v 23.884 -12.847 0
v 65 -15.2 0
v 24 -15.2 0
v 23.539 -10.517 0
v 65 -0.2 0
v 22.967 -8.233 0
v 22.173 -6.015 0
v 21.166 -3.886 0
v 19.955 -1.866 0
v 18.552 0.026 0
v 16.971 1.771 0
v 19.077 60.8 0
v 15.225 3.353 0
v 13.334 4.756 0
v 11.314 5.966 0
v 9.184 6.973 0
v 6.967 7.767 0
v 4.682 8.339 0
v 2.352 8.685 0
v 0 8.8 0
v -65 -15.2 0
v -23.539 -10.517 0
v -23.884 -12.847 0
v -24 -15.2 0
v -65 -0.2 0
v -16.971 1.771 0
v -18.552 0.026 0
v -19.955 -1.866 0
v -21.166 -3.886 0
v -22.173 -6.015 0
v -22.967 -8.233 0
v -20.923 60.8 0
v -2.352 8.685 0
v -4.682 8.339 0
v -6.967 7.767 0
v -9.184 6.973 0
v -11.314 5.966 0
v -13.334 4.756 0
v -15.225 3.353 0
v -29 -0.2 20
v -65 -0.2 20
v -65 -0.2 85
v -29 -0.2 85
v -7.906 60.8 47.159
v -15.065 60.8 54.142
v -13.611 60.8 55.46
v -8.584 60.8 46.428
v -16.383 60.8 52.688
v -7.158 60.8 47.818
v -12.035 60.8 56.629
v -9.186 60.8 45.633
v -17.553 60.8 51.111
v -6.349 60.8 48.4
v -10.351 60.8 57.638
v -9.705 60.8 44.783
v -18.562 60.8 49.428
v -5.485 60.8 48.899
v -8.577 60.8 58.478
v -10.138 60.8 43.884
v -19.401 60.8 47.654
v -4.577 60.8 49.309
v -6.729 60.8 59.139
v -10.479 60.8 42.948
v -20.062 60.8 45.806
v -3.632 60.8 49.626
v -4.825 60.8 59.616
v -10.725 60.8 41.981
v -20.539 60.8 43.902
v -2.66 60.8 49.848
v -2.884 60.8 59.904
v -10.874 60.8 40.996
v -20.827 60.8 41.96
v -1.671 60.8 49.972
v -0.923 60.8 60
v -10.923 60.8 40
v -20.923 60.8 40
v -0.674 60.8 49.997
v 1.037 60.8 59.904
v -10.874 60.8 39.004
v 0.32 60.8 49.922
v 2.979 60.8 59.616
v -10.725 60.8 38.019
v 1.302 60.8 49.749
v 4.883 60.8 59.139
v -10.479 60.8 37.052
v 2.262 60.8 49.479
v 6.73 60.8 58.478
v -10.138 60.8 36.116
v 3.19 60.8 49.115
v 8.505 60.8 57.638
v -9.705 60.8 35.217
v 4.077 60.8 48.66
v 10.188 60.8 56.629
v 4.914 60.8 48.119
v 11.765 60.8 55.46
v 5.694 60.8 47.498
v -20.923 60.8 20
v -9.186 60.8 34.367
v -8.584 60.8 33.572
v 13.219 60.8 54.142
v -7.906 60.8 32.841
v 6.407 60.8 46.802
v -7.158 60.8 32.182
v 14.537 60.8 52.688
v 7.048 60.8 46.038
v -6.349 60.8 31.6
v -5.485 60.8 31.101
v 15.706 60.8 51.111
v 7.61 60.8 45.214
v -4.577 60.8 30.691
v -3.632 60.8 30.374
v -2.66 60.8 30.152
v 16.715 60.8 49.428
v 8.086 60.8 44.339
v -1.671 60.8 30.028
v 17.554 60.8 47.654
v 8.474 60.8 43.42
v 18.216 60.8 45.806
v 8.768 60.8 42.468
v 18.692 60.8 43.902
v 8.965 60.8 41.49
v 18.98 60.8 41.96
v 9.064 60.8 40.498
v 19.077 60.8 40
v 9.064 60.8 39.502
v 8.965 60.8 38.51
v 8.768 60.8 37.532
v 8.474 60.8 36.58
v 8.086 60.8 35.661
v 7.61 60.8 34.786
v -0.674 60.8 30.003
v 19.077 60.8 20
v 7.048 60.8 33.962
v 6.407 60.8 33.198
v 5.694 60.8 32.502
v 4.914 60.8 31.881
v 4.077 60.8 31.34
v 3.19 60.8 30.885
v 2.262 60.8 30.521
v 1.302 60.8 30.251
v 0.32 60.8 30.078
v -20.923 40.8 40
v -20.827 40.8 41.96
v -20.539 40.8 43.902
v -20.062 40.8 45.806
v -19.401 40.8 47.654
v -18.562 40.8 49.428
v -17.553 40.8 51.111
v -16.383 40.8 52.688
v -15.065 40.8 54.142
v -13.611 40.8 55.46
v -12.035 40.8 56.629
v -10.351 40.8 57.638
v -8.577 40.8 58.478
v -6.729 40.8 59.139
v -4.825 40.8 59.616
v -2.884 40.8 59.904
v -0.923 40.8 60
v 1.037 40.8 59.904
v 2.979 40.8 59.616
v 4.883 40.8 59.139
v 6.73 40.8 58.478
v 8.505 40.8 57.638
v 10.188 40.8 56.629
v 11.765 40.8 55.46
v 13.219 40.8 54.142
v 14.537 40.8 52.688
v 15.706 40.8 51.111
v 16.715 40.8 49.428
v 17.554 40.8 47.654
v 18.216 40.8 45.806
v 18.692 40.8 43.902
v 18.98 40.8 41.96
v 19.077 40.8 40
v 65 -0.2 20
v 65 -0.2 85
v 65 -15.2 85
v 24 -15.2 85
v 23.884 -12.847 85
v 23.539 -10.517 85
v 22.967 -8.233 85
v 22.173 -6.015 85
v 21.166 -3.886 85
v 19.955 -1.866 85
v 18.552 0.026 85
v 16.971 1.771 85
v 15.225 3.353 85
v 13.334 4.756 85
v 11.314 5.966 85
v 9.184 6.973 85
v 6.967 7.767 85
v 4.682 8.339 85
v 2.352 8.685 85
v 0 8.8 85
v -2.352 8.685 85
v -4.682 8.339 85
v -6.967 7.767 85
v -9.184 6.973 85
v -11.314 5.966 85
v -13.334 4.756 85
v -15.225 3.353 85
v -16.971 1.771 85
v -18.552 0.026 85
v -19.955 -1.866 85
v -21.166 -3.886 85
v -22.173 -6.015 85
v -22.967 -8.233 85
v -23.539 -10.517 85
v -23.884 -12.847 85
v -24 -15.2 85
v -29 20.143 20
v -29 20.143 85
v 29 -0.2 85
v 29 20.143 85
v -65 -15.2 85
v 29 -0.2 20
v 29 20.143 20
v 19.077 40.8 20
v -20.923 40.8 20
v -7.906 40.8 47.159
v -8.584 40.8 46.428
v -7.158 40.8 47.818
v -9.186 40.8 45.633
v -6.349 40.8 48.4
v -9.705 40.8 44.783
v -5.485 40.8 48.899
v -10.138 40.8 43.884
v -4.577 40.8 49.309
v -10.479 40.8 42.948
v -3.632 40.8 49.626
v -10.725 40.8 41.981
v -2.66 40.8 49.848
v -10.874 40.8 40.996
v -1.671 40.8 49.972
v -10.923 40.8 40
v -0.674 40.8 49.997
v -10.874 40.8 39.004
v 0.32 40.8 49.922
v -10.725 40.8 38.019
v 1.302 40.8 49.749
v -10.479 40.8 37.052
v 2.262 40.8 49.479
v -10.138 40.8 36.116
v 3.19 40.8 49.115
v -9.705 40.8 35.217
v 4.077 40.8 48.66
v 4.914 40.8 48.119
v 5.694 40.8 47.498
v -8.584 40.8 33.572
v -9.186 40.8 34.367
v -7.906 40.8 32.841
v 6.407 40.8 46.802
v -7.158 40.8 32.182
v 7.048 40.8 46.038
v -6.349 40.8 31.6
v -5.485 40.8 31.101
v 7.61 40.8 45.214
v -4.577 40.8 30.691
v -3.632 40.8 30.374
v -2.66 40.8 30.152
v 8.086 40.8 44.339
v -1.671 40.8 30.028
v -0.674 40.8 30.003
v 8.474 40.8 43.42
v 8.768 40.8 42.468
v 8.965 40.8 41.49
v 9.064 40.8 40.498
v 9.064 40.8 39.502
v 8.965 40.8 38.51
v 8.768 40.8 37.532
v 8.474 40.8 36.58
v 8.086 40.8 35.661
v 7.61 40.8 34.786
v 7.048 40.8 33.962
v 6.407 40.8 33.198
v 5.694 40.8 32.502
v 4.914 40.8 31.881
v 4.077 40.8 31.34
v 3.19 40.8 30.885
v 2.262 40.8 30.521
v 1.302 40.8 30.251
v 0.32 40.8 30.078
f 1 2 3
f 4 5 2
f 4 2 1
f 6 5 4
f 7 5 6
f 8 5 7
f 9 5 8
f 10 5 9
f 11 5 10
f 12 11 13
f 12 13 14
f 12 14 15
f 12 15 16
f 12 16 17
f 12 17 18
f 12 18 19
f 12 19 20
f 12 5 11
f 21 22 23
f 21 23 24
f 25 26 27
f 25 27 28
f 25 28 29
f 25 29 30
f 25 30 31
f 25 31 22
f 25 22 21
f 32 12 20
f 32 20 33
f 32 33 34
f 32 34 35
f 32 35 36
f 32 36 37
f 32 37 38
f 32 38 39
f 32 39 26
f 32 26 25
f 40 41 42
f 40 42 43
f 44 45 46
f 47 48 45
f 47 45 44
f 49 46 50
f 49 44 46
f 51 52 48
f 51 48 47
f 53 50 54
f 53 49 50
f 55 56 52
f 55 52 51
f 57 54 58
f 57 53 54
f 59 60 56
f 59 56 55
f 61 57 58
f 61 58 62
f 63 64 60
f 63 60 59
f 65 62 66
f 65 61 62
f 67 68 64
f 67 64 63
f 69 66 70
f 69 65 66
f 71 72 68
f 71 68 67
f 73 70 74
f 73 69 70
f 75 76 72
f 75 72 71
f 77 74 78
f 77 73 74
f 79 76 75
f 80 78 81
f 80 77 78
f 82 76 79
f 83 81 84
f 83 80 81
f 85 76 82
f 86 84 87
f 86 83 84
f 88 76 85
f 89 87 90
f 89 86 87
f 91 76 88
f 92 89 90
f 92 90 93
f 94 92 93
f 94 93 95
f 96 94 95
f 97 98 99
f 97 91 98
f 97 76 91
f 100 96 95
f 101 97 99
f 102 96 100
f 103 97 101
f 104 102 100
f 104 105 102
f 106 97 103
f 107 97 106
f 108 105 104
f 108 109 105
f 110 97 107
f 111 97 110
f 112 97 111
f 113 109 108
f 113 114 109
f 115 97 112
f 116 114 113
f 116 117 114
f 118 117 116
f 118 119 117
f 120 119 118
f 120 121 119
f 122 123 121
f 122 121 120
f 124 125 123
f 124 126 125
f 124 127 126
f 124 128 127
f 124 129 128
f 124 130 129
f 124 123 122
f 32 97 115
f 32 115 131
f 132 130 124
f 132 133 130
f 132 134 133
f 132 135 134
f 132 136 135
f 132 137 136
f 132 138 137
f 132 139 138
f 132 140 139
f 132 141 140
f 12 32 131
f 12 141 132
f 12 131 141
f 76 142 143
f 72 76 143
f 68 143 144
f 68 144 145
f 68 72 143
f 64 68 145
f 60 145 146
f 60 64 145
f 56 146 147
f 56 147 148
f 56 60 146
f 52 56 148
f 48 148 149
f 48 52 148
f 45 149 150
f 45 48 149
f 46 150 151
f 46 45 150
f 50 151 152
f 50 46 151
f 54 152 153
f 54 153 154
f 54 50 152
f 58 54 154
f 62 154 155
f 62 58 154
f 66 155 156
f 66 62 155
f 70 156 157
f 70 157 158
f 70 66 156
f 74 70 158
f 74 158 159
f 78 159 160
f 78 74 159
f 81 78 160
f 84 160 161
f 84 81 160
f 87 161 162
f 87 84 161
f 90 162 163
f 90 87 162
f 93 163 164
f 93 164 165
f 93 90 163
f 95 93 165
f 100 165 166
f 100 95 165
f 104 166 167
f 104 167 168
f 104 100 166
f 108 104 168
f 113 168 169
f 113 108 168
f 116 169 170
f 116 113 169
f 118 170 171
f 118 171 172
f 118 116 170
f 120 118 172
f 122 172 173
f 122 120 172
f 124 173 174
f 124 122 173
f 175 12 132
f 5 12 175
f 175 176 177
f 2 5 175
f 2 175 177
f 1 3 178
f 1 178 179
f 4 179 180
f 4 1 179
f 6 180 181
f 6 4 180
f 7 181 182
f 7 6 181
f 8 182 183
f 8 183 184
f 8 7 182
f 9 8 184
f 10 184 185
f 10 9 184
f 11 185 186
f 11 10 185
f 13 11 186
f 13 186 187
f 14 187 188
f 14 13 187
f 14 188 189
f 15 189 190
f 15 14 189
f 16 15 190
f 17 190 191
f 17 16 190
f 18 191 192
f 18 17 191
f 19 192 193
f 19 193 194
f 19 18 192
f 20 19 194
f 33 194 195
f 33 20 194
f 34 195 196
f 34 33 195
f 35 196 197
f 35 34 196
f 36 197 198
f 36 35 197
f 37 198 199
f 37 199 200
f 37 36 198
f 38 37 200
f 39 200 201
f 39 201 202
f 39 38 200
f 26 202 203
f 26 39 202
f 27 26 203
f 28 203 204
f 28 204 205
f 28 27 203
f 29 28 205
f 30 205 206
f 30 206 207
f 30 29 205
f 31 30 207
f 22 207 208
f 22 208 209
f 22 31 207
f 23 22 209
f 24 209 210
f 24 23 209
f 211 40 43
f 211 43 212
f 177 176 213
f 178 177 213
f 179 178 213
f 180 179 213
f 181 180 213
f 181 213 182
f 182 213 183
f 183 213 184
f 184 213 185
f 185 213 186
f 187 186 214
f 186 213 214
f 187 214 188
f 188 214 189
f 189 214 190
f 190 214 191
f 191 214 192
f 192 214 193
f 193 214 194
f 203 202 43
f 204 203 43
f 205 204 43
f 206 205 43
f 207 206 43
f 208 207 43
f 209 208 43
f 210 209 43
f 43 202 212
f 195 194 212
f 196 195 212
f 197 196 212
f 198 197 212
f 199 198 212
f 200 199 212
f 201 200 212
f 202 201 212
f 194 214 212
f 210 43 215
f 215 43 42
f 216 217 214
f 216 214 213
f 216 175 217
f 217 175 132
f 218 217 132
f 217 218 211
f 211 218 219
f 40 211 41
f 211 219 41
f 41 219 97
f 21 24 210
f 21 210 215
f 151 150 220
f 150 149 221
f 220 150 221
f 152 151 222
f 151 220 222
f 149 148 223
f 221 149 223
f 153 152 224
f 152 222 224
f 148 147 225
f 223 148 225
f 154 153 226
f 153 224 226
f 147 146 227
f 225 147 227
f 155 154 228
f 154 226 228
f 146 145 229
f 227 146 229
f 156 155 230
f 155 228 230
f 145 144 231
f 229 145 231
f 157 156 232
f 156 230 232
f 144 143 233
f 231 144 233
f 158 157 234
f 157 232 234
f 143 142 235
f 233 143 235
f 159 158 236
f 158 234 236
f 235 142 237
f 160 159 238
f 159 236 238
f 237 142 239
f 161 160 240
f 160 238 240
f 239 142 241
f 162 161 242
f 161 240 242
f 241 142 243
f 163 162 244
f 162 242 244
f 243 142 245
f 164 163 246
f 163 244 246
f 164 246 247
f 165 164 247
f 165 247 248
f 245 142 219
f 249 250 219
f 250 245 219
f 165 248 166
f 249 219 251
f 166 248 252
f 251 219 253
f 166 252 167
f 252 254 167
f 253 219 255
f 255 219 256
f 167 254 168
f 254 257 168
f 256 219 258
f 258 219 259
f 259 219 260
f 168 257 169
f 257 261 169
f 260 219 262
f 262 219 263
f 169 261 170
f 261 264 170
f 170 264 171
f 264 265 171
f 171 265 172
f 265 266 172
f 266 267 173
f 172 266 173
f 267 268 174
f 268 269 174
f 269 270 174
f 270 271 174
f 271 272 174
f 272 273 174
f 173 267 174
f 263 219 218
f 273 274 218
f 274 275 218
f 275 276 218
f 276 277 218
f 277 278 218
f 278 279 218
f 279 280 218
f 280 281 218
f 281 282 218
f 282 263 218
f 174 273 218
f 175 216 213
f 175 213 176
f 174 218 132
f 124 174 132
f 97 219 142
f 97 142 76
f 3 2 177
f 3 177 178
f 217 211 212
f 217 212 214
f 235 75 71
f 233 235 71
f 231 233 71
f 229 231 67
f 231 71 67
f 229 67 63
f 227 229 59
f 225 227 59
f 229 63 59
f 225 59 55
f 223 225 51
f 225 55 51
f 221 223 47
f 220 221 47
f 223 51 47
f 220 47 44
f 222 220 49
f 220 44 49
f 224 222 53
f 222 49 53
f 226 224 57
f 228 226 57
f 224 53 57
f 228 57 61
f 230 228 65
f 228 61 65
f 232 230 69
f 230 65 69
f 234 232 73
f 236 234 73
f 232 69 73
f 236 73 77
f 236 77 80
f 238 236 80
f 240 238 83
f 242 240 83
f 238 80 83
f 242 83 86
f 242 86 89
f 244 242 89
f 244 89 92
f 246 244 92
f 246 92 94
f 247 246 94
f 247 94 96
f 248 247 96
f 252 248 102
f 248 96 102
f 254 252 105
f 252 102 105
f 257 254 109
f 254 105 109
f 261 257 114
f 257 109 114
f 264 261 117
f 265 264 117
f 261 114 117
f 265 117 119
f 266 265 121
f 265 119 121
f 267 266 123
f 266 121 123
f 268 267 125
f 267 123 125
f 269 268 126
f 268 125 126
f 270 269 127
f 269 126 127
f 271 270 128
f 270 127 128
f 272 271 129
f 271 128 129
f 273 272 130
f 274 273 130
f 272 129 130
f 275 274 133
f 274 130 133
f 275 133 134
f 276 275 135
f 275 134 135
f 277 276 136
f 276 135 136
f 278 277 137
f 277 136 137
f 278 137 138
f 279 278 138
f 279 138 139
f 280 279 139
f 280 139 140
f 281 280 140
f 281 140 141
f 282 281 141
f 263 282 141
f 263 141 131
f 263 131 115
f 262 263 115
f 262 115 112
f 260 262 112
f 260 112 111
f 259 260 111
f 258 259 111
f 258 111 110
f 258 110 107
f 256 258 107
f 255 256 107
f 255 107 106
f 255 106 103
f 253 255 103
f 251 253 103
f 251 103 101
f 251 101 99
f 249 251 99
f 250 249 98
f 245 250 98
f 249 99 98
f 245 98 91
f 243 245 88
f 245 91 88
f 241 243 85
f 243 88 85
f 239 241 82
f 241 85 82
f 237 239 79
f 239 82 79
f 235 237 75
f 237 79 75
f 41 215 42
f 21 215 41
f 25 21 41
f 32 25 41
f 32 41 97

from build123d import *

# Parameters (mm, degrees)
EXTRUDE_2_DEPTH     = 85
EXTRUDE_3_DEPTH     = 20
SKETCH_5_W          = 40
SKETCH_5_H          = 20
EXTRUDE_4_DEPTH     = 40
FILLET_1_R          = 20
SKETCH_6_R          = 10
CUT_EXTRUDE_1_DEPTH = 20


with BuildPart() as part:
    # 스케치1 → 보스-돌출2 (new body)
    with BuildSketch(Plane.XY):
        with BuildLine():
            Line((-24, -15.199619772), (-65, -15.199619772))
            Line((-65, -15.199619772), (-65, -0.199619772))
            Line((-65, -0.199619772), (-29, -0.199619772))
            Line((-29, -0.199619772), (-29, 20.142585551))
            Line((-29, 20.142585551), (29, 20.142585551))
            Line((29, 20.142585551), (29, -0.199619772))
            Line((29, -0.199619772), (65, -0.199619772))
            Line((65, -0.199619772), (65, -15.199619772))
            Line((65, -15.199619772), (24, -15.199619772))
            ThreePointArc((24, -15.199619772), (0, 8.800380228), (-24, -15.199619772))
        make_face()
    extrude(amount=EXTRUDE_2_DEPTH)

    # 스케치4 → 보스-돌출3 (add)
    with BuildSketch(Plane(origin=(0, 0, 0), x_dir=(-1, 0, 0), z_dir=(0, 0, -1))):
        Polygon((-65, -0.199619772), (-29, -0.199619772), (-29, 20.142585551), (29, 20.142585551), (29, -0.199619772), (65, -0.199619772), (20.923247903, 60.800380228), (-19.076752097, 60.800380228), align=None)
    extrude(amount=-EXTRUDE_3_DEPTH)

    # 스케치5 → 보스-돌출4 (add)
    with BuildSketch(Plane.XY.offset(20)):
        with Locations((-0.923247903, 50.800380228)):
            Rectangle(SKETCH_5_W, SKETCH_5_H)
    extrude(amount=EXTRUDE_4_DEPTH)

    # 필렛1
    fillet_1_edges = [part.edges().sort_by_distance(p)[0] for p in [
        (-20.923247903, 50.800380228, 60),
        (19.076752097, 50.800380228, 60),
    ]]
    fillet(fillet_1_edges, radius=FILLET_1_R - 0.0001)  # a hair under: the kernel refuses the full size

    # 스케치6 → 컷-돌출1 (cut)
    with BuildSketch(Plane(origin=(0, 60.800380228, 0), x_dir=(1, 0, 0), z_dir=(0, 1, 0))):
        with Locations(Location((-0.923247903, -40, 0), (0, 0, 180))):
            Circle(SKETCH_6_R)
    extrude(amount=-CUT_EXTRUDE_1_DEPTH, mode=Mode.SUBTRACT)


solid = part.part
